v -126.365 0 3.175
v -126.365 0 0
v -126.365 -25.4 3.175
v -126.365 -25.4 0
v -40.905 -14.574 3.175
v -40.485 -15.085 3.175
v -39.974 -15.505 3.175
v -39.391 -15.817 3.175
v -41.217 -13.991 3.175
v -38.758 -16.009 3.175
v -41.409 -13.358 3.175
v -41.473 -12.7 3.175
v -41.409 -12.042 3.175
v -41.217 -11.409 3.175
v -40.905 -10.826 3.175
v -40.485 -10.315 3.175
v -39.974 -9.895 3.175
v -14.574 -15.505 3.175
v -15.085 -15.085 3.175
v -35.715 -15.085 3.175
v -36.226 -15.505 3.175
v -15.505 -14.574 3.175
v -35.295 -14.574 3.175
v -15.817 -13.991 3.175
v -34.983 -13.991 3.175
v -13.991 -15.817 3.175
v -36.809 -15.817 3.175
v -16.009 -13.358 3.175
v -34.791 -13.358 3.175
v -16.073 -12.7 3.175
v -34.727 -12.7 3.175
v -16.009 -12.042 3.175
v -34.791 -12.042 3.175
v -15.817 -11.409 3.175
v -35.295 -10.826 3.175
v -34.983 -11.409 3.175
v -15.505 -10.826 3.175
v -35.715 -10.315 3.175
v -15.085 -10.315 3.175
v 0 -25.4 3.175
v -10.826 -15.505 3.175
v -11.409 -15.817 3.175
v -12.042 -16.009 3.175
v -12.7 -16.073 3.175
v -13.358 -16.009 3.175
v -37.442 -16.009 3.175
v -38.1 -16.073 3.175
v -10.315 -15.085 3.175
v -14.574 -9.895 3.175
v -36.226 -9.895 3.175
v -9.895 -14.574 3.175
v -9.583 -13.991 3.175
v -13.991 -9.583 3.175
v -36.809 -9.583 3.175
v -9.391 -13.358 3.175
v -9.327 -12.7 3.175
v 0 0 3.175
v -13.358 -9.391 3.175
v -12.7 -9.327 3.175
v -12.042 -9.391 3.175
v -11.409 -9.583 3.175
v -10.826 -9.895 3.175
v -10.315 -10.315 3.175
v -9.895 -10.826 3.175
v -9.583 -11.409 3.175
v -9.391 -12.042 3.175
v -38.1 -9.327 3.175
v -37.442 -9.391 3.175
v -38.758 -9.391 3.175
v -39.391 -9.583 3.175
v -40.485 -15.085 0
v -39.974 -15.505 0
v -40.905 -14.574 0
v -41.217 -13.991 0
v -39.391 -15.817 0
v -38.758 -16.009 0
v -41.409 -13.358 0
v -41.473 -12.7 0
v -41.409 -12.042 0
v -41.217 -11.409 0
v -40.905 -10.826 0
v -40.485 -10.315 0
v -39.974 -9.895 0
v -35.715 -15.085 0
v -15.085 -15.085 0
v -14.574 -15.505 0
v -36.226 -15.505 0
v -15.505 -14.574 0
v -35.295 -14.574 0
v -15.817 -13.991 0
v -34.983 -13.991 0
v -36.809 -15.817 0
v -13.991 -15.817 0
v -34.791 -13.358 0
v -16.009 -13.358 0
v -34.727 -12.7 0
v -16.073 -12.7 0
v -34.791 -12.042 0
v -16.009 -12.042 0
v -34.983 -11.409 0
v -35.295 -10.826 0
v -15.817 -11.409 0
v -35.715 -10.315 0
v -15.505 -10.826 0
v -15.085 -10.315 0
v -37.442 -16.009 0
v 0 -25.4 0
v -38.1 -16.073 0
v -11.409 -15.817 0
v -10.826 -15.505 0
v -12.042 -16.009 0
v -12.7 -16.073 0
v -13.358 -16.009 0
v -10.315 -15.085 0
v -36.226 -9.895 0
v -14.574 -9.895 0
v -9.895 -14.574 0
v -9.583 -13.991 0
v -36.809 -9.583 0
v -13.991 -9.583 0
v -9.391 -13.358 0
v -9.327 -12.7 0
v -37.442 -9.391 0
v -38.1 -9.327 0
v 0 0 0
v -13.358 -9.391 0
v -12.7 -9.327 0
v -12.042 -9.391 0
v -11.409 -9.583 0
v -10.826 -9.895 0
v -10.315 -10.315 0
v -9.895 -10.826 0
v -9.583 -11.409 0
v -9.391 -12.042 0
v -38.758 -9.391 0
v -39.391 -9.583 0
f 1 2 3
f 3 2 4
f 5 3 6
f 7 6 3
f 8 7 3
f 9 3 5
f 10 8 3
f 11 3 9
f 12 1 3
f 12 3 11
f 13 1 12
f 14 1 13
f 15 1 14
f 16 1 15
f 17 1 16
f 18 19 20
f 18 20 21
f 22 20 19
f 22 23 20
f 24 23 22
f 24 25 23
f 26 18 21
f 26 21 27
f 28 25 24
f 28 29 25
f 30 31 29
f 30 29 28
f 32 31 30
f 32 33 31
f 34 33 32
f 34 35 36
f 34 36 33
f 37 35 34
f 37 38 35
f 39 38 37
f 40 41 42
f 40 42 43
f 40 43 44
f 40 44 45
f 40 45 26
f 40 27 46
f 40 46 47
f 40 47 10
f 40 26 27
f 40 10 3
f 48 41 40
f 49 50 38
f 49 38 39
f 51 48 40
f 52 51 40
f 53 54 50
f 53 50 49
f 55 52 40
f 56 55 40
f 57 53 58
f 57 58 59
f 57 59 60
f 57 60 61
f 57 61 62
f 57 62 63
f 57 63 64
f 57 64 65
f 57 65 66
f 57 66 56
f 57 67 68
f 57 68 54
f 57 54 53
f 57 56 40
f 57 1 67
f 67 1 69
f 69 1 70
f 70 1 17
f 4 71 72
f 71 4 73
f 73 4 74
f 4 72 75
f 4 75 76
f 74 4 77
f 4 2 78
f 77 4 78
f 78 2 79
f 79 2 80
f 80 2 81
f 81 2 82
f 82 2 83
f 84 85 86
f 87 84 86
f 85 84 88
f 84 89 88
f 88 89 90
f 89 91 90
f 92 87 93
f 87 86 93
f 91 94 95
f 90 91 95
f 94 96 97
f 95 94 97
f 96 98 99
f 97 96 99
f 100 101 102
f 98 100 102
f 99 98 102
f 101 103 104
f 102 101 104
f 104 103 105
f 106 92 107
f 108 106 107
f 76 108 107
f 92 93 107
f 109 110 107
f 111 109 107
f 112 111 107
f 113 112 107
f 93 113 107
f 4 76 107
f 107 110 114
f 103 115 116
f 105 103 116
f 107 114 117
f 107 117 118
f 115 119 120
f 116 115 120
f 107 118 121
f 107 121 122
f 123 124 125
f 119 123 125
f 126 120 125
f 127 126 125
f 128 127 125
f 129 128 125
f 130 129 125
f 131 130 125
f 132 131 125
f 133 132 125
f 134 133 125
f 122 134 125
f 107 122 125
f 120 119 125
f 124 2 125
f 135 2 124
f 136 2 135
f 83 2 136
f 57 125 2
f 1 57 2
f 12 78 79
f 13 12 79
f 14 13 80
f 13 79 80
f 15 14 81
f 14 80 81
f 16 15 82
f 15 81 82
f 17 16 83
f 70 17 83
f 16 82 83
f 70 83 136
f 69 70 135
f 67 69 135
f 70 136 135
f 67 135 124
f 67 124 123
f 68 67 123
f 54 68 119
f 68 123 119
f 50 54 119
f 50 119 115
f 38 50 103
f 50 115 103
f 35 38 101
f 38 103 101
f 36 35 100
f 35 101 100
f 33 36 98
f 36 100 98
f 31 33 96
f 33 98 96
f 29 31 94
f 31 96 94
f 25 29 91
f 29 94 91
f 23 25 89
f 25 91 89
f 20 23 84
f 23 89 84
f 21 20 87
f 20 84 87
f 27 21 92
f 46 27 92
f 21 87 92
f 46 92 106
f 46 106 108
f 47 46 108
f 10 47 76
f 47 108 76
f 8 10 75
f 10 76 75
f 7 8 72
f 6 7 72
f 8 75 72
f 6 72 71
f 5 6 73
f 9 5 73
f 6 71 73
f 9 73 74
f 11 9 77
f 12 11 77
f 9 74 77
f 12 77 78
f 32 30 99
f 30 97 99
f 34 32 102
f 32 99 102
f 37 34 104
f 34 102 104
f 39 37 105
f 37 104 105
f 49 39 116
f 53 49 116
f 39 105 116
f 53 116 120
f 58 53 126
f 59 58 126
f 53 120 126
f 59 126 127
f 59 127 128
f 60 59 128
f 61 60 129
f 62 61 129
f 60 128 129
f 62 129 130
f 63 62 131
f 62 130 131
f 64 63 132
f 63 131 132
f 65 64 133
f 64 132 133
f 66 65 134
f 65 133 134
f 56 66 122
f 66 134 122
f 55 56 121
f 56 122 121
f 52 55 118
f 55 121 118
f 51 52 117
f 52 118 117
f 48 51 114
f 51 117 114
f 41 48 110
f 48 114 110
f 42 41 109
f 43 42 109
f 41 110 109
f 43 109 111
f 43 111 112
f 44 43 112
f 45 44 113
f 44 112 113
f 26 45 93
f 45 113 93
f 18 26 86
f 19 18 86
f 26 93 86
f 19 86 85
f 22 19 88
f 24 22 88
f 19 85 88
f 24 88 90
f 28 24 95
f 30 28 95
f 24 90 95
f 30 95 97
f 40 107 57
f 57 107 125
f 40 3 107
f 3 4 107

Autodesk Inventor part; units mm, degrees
ref_plane "YZ Plane" through (0, 0, 0) normal (1, 0, 0) x (0, 1, 0)
ref_plane "XZ Plane" through (0, 0, 0) normal (0, 1, 0) x (-1, 0, 0)
ref_plane "XY Plane" through (0, 0, 0) normal (0, 0, 1) x (1, 0, 0)
sketch "Sketch1" plane through (0, 0, 0) normal (0, 0, 1) x (1, 0, 0)
  line L0 (0, 0) -> (-126.365, 0)
  line L1 (-126.365, 0) -> (-126.365, -25.4)
  line L2 (-126.365, -25.4) -> (0, -25.4)
  line L3 (0, -25.4) -> (0, 0)
  dimension "d0" = 126.365
  dimension "d1" = 25.4
extrude "Extrusion1" add sketch "Sketch1" along normal blind 3.175
sketch "Sketch2" plane through (0, 0, 0) normal (0, 0, -1) x (-1, 0, 0)
  circle A0 centre (38.1, -12.7) radius 3.3734
  circle A1 centre (12.7, -12.7) radius 3.3734
  line L0 (0, 0) -> (126.365, 0) projected
  line L1 (0, -25.4) -> (0, 0) projected
  dimension "d4" = 6.7469
  dimension "d5" = 12.7
  dimension "d6" = 12.7
  dimension "d7" = 25.4
  dimension "d8" = 12.7
extrude "Extrusion2" cut sketch "Sketch2" against normal blind 3.175
properties part number "supportbeam2" material "Aluminum 6061"
